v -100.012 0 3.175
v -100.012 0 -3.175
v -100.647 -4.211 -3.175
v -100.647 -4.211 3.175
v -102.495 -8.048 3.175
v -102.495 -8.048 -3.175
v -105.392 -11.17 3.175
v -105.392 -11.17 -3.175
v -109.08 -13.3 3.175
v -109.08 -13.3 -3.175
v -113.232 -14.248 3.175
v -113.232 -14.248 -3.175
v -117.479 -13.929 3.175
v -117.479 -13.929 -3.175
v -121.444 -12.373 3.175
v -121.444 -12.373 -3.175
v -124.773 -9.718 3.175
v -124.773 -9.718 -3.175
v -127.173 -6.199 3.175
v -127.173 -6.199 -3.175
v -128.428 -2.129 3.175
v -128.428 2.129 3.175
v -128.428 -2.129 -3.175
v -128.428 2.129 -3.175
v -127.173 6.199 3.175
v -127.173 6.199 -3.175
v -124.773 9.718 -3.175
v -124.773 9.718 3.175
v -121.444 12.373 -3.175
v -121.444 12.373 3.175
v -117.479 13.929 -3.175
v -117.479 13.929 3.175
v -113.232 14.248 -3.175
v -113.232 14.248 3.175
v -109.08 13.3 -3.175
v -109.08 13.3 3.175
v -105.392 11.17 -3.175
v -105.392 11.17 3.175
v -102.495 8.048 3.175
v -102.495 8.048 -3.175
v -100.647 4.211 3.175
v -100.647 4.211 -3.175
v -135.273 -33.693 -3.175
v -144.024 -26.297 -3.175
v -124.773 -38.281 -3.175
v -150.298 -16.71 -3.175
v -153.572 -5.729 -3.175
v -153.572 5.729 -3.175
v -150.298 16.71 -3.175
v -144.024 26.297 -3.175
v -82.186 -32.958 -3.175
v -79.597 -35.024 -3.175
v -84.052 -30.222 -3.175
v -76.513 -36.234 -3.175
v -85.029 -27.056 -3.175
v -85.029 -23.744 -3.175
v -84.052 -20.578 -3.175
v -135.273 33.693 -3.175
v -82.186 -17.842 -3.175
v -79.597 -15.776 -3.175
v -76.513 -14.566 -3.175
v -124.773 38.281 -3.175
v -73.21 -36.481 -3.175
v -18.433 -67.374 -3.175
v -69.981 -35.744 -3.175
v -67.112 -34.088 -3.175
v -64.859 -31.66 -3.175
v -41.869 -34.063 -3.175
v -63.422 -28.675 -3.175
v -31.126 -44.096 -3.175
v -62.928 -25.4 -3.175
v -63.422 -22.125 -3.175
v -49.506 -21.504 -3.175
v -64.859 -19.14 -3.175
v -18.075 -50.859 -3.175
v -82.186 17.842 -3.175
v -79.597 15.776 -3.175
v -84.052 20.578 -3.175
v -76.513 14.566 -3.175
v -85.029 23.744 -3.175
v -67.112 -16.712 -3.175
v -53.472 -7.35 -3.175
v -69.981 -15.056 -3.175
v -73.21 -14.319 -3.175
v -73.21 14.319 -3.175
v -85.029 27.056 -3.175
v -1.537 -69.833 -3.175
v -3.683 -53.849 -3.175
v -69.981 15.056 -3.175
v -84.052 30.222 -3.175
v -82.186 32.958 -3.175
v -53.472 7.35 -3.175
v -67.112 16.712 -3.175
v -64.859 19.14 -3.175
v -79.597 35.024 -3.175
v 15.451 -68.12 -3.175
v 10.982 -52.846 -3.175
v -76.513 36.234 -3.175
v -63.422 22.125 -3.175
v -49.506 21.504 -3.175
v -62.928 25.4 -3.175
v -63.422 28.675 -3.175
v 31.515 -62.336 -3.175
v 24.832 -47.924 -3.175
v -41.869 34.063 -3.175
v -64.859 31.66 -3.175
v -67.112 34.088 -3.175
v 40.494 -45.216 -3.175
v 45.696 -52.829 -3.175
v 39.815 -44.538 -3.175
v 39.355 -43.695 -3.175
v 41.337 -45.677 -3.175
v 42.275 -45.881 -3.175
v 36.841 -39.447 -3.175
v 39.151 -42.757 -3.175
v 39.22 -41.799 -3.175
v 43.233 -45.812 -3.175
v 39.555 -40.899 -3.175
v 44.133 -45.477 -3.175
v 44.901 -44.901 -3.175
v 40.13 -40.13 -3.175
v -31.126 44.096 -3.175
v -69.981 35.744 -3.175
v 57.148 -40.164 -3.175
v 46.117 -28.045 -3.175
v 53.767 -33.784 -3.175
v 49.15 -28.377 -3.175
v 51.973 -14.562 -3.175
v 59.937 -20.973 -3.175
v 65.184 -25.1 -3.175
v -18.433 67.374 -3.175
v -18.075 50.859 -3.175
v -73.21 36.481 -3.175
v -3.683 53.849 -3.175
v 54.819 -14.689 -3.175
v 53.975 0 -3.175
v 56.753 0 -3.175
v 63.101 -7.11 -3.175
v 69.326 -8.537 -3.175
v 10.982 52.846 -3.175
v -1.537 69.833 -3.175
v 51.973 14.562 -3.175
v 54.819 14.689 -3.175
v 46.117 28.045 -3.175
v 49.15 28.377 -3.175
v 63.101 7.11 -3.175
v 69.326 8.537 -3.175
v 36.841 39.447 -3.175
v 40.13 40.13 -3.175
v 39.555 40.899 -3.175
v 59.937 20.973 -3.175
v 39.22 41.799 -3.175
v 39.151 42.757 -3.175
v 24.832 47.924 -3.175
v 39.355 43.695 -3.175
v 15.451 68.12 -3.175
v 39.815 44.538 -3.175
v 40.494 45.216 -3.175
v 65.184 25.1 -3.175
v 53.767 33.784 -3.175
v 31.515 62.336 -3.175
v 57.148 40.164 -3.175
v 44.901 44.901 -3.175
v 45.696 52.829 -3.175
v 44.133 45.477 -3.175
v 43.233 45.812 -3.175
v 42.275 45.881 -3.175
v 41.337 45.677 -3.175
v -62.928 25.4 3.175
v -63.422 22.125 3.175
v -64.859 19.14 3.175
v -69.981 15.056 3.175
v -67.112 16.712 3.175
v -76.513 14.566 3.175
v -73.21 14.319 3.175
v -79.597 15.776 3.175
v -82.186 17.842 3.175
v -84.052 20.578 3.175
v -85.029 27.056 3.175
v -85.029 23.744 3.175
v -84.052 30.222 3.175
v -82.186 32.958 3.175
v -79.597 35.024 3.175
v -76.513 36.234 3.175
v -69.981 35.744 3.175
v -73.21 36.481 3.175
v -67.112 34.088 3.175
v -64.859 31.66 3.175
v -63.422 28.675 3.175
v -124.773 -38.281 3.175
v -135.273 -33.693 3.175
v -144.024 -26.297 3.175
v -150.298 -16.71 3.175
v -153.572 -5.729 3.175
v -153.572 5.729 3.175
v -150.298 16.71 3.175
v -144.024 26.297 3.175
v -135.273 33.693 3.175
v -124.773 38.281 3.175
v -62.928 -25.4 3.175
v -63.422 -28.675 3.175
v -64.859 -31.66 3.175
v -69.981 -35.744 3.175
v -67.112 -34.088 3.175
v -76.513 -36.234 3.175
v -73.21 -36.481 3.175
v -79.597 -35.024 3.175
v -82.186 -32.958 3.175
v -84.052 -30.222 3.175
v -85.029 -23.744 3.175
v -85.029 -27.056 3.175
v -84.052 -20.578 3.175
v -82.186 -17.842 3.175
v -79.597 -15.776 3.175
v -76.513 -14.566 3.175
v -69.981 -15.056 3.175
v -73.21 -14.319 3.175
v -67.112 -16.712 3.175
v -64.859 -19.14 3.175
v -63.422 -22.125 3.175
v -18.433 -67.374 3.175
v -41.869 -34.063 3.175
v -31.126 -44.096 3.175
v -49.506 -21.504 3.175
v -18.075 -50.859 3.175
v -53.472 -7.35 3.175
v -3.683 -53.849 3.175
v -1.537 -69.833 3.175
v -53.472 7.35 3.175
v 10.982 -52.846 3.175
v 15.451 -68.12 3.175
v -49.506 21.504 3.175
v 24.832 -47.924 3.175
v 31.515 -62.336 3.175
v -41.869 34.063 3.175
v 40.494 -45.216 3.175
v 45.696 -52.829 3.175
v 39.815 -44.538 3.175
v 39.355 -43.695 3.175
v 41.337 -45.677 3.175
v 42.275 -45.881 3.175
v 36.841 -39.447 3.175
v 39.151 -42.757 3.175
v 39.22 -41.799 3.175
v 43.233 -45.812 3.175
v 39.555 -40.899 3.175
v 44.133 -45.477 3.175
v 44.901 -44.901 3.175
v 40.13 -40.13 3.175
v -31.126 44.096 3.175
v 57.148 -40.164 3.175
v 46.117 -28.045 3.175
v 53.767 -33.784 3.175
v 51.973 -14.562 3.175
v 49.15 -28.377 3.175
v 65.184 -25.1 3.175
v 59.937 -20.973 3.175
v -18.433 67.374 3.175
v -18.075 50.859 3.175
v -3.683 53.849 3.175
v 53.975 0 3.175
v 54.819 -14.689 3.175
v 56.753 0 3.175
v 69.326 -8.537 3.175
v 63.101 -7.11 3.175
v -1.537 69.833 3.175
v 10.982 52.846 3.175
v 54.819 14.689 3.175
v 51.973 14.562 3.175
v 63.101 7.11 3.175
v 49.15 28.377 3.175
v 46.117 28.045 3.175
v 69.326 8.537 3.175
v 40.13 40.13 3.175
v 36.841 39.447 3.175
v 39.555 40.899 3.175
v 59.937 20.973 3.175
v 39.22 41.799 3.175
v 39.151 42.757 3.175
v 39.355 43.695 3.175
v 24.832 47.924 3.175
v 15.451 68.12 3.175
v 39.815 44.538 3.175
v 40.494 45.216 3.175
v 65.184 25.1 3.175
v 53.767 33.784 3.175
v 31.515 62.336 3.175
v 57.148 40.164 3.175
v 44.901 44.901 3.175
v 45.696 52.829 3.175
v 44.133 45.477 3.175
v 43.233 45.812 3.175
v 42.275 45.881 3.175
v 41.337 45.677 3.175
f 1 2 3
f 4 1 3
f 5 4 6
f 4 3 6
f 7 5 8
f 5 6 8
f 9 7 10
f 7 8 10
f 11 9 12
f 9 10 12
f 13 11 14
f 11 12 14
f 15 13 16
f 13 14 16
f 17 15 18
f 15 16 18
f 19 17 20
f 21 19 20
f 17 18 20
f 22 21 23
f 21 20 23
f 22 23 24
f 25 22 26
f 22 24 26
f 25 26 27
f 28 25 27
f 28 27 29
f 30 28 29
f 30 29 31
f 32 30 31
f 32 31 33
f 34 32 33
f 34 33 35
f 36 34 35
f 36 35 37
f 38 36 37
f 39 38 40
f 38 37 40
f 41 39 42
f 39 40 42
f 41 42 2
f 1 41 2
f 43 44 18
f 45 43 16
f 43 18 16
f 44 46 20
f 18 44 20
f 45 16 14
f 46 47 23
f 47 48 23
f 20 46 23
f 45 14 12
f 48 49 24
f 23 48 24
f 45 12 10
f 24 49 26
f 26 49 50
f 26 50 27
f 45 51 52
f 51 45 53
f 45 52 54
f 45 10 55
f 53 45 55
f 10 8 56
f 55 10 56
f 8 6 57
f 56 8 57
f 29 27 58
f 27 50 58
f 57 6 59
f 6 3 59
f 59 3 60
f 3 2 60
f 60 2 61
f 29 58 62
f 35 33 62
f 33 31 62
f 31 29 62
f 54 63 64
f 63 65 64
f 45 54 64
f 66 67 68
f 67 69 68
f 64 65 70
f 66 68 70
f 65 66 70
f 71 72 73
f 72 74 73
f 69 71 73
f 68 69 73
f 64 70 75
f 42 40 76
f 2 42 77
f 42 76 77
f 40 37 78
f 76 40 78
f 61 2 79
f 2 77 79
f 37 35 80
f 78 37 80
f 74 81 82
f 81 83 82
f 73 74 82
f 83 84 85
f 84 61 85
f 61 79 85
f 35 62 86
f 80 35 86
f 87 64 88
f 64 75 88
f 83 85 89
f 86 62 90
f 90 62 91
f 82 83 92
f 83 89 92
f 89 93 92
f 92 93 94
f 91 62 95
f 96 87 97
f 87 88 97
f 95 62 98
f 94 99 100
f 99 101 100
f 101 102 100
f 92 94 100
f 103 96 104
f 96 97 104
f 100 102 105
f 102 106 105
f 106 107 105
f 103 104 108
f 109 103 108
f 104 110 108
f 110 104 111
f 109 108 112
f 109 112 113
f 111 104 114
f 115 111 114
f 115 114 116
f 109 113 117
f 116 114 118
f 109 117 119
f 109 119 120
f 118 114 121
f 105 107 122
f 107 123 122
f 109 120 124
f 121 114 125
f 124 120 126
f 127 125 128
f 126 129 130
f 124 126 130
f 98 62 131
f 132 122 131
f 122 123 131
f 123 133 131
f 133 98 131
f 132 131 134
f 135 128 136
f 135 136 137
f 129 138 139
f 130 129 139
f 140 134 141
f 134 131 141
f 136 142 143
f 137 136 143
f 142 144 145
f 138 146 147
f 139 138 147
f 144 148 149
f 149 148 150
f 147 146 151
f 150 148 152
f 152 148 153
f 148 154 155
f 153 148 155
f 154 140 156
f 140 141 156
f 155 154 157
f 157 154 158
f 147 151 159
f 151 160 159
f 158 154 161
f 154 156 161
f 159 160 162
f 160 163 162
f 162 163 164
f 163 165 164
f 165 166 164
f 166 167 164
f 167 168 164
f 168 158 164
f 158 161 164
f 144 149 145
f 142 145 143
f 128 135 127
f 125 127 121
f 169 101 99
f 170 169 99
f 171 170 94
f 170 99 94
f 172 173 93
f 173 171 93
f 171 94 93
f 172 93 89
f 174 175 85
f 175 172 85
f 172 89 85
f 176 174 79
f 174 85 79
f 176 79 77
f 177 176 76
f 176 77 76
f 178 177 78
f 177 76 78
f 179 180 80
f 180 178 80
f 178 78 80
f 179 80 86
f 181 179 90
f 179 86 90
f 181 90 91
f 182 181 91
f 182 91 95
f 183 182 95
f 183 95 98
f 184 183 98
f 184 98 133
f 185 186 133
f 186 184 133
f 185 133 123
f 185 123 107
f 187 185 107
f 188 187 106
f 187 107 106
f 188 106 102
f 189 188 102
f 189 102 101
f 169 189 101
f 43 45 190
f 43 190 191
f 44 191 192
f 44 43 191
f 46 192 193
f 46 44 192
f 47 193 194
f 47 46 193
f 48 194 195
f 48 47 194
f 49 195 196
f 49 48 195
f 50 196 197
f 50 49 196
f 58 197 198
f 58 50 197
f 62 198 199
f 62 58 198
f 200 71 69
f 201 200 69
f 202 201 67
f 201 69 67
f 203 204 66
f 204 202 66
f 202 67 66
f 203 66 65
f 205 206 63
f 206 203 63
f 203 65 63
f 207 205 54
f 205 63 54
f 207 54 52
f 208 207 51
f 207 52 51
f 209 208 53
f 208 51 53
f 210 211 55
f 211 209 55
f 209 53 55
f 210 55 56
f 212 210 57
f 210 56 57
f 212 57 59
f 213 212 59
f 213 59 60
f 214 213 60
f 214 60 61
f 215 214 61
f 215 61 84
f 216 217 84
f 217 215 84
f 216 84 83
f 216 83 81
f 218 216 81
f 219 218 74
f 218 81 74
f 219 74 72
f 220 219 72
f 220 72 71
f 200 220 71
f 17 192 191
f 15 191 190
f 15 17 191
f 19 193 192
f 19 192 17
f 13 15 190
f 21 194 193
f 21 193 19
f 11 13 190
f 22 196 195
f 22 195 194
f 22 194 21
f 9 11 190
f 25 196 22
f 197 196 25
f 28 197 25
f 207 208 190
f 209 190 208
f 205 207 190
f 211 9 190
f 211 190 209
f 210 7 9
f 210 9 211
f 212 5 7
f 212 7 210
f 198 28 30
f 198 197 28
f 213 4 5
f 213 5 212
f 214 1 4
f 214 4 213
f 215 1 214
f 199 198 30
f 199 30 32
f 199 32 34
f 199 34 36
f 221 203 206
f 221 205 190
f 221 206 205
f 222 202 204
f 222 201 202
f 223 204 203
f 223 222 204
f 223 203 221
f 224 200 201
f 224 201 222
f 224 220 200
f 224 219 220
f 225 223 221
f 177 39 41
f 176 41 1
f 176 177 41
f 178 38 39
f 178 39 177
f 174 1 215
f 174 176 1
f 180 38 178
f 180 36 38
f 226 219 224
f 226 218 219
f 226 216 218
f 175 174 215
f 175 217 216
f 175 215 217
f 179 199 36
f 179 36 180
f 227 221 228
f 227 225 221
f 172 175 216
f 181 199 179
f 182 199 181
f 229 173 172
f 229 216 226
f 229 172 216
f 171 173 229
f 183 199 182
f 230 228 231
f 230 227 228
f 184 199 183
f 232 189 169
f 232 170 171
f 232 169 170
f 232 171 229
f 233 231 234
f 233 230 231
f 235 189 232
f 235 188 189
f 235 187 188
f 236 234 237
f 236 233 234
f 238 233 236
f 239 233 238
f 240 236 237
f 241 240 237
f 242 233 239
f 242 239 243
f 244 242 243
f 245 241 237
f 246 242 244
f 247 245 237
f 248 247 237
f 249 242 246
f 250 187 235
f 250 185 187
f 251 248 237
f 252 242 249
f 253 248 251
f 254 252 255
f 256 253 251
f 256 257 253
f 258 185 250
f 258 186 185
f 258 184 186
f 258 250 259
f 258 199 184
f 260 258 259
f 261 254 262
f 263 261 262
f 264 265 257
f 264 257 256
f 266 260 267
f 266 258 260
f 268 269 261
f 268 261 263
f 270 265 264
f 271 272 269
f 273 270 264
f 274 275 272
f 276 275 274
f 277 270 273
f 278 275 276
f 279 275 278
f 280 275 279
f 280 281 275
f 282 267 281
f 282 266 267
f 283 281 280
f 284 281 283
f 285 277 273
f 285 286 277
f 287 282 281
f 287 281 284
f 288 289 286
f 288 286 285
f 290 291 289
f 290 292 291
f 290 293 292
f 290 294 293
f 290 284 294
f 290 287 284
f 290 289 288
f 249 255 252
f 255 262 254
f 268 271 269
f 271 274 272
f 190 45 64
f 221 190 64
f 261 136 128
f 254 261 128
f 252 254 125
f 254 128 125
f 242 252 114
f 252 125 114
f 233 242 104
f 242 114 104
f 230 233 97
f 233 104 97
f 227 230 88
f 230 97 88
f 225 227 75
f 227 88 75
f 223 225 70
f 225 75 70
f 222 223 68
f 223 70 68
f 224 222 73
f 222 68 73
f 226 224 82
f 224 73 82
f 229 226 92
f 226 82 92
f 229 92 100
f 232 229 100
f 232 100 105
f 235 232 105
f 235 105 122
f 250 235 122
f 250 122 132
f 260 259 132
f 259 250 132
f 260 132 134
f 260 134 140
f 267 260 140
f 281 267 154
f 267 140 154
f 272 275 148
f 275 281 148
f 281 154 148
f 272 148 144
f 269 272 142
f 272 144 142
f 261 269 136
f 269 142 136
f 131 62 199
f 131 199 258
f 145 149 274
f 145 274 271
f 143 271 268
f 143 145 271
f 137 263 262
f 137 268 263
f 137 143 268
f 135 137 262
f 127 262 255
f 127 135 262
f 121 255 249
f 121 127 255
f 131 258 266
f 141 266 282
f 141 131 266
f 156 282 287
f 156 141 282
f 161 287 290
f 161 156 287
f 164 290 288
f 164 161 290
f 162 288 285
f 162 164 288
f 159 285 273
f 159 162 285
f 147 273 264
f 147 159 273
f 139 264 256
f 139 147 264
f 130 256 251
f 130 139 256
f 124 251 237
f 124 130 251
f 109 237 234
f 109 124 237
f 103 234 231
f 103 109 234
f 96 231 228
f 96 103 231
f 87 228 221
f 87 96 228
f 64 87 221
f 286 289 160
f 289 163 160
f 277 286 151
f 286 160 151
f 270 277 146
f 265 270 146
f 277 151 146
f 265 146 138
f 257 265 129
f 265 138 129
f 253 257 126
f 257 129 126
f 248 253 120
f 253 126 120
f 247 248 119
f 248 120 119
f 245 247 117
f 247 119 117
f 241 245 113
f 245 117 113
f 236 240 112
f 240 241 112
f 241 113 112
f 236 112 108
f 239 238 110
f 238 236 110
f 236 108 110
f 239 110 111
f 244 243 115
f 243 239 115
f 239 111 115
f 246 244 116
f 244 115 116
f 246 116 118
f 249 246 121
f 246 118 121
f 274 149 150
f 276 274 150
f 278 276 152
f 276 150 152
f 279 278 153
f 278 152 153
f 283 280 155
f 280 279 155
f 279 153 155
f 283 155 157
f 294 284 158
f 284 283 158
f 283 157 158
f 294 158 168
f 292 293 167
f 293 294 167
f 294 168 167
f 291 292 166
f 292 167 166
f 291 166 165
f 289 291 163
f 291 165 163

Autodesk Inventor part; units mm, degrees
ref_plane "YZ Plane" through (0, 0, 0) normal (1, 0, 0) x (0, 1, 0)
ref_plane "XZ Plane" through (0, 0, 0) normal (0, 1, 0) x (-1, 0, 0)
ref_plane "XY Plane" through (0, 0, 0) normal (0, 0, 1) x (1, 0, 0)
sketch "Sketch1" plane through (0, 0, 0) normal (0, 0, 1) x (1, 0, 0)
  line L0 (-198.755, 0) -> (114.6175, 0) projected
  line L1 (0, -97.79) -> (0, 97.79) projected
  circle A0 centre (0, 0) radius 50.8 construction
  arc A1 (-18.4326, -67.374) -> (-18.4326, 67.374) centre (0, 0) ccw
  arc A2 (44.9013, -44.9013) -> (44.9013, 44.9013) centre (0, 0) ccw
  arc A3 (40.1305, -40.1305) -> (40.1305, 40.1305) centre (0, 0) ccw
  line L2 (0, 0) -> (44.9013, 44.9013) construction
  line L3 (0, 0) -> (44.9013, -44.9013) construction
  arc A4 (44.9013, 44.9013) -> (40.1305, 40.1305) centre (42.5159, 42.5159) ccw
  arc A5 (40.1305, -40.1305) -> (44.9013, -44.9013) centre (42.5159, -42.5159) ccw
  circle A6 centre (-114.3, 0) radius 14.2875
  arc A7 (-124.7731, 38.2807) -> (-124.7731, -38.2807) centre (-114.3, 0) ccw
  line L4 (-114.3, -14.2875) -> (-114.3, 14.2875) construction
  line L5 (-124.7731, 38.2807) -> (-18.4326, 67.374)
  line L6 (-124.7731, -38.2807) -> (-18.4326, -67.374)
  circle A8 centre (-74.0404, 25.4) radius 11.1125
  circle A9 centre (-74.0404, -25.4) radius 11.1125
  circle A10 centre (0, 0) radius 19.05
  circle A11 centre (0, 0) radius 53.975
  dimension "d0" = 101.6
  dimension "d1" = 19.05
  dimension "d2" = 6.7469
  dimension "d3" = 6.35
  dimension "d6" = 28.575
  dimension "d7" = 25.4
  dimension "d9" = 22.225
  dimension "d10" = 38.1
  dimension "d11" = 45
  dimension "d12" = 45
  dimension "d13" = 3.175
  dimension "d14" = 114.3
extrude "Extrusion1" add sketch "Sketch1" along normal mid plane 6.35 contours A11 L1 A1 L0 A2 A4 A3 | L0 A3 A5 A2 A1 L1 A11 | A11 L0 A6 A7 L5 A1 L1 | L1 A1 L6 A7 L0 A6 A11
properties part number "back plate"
